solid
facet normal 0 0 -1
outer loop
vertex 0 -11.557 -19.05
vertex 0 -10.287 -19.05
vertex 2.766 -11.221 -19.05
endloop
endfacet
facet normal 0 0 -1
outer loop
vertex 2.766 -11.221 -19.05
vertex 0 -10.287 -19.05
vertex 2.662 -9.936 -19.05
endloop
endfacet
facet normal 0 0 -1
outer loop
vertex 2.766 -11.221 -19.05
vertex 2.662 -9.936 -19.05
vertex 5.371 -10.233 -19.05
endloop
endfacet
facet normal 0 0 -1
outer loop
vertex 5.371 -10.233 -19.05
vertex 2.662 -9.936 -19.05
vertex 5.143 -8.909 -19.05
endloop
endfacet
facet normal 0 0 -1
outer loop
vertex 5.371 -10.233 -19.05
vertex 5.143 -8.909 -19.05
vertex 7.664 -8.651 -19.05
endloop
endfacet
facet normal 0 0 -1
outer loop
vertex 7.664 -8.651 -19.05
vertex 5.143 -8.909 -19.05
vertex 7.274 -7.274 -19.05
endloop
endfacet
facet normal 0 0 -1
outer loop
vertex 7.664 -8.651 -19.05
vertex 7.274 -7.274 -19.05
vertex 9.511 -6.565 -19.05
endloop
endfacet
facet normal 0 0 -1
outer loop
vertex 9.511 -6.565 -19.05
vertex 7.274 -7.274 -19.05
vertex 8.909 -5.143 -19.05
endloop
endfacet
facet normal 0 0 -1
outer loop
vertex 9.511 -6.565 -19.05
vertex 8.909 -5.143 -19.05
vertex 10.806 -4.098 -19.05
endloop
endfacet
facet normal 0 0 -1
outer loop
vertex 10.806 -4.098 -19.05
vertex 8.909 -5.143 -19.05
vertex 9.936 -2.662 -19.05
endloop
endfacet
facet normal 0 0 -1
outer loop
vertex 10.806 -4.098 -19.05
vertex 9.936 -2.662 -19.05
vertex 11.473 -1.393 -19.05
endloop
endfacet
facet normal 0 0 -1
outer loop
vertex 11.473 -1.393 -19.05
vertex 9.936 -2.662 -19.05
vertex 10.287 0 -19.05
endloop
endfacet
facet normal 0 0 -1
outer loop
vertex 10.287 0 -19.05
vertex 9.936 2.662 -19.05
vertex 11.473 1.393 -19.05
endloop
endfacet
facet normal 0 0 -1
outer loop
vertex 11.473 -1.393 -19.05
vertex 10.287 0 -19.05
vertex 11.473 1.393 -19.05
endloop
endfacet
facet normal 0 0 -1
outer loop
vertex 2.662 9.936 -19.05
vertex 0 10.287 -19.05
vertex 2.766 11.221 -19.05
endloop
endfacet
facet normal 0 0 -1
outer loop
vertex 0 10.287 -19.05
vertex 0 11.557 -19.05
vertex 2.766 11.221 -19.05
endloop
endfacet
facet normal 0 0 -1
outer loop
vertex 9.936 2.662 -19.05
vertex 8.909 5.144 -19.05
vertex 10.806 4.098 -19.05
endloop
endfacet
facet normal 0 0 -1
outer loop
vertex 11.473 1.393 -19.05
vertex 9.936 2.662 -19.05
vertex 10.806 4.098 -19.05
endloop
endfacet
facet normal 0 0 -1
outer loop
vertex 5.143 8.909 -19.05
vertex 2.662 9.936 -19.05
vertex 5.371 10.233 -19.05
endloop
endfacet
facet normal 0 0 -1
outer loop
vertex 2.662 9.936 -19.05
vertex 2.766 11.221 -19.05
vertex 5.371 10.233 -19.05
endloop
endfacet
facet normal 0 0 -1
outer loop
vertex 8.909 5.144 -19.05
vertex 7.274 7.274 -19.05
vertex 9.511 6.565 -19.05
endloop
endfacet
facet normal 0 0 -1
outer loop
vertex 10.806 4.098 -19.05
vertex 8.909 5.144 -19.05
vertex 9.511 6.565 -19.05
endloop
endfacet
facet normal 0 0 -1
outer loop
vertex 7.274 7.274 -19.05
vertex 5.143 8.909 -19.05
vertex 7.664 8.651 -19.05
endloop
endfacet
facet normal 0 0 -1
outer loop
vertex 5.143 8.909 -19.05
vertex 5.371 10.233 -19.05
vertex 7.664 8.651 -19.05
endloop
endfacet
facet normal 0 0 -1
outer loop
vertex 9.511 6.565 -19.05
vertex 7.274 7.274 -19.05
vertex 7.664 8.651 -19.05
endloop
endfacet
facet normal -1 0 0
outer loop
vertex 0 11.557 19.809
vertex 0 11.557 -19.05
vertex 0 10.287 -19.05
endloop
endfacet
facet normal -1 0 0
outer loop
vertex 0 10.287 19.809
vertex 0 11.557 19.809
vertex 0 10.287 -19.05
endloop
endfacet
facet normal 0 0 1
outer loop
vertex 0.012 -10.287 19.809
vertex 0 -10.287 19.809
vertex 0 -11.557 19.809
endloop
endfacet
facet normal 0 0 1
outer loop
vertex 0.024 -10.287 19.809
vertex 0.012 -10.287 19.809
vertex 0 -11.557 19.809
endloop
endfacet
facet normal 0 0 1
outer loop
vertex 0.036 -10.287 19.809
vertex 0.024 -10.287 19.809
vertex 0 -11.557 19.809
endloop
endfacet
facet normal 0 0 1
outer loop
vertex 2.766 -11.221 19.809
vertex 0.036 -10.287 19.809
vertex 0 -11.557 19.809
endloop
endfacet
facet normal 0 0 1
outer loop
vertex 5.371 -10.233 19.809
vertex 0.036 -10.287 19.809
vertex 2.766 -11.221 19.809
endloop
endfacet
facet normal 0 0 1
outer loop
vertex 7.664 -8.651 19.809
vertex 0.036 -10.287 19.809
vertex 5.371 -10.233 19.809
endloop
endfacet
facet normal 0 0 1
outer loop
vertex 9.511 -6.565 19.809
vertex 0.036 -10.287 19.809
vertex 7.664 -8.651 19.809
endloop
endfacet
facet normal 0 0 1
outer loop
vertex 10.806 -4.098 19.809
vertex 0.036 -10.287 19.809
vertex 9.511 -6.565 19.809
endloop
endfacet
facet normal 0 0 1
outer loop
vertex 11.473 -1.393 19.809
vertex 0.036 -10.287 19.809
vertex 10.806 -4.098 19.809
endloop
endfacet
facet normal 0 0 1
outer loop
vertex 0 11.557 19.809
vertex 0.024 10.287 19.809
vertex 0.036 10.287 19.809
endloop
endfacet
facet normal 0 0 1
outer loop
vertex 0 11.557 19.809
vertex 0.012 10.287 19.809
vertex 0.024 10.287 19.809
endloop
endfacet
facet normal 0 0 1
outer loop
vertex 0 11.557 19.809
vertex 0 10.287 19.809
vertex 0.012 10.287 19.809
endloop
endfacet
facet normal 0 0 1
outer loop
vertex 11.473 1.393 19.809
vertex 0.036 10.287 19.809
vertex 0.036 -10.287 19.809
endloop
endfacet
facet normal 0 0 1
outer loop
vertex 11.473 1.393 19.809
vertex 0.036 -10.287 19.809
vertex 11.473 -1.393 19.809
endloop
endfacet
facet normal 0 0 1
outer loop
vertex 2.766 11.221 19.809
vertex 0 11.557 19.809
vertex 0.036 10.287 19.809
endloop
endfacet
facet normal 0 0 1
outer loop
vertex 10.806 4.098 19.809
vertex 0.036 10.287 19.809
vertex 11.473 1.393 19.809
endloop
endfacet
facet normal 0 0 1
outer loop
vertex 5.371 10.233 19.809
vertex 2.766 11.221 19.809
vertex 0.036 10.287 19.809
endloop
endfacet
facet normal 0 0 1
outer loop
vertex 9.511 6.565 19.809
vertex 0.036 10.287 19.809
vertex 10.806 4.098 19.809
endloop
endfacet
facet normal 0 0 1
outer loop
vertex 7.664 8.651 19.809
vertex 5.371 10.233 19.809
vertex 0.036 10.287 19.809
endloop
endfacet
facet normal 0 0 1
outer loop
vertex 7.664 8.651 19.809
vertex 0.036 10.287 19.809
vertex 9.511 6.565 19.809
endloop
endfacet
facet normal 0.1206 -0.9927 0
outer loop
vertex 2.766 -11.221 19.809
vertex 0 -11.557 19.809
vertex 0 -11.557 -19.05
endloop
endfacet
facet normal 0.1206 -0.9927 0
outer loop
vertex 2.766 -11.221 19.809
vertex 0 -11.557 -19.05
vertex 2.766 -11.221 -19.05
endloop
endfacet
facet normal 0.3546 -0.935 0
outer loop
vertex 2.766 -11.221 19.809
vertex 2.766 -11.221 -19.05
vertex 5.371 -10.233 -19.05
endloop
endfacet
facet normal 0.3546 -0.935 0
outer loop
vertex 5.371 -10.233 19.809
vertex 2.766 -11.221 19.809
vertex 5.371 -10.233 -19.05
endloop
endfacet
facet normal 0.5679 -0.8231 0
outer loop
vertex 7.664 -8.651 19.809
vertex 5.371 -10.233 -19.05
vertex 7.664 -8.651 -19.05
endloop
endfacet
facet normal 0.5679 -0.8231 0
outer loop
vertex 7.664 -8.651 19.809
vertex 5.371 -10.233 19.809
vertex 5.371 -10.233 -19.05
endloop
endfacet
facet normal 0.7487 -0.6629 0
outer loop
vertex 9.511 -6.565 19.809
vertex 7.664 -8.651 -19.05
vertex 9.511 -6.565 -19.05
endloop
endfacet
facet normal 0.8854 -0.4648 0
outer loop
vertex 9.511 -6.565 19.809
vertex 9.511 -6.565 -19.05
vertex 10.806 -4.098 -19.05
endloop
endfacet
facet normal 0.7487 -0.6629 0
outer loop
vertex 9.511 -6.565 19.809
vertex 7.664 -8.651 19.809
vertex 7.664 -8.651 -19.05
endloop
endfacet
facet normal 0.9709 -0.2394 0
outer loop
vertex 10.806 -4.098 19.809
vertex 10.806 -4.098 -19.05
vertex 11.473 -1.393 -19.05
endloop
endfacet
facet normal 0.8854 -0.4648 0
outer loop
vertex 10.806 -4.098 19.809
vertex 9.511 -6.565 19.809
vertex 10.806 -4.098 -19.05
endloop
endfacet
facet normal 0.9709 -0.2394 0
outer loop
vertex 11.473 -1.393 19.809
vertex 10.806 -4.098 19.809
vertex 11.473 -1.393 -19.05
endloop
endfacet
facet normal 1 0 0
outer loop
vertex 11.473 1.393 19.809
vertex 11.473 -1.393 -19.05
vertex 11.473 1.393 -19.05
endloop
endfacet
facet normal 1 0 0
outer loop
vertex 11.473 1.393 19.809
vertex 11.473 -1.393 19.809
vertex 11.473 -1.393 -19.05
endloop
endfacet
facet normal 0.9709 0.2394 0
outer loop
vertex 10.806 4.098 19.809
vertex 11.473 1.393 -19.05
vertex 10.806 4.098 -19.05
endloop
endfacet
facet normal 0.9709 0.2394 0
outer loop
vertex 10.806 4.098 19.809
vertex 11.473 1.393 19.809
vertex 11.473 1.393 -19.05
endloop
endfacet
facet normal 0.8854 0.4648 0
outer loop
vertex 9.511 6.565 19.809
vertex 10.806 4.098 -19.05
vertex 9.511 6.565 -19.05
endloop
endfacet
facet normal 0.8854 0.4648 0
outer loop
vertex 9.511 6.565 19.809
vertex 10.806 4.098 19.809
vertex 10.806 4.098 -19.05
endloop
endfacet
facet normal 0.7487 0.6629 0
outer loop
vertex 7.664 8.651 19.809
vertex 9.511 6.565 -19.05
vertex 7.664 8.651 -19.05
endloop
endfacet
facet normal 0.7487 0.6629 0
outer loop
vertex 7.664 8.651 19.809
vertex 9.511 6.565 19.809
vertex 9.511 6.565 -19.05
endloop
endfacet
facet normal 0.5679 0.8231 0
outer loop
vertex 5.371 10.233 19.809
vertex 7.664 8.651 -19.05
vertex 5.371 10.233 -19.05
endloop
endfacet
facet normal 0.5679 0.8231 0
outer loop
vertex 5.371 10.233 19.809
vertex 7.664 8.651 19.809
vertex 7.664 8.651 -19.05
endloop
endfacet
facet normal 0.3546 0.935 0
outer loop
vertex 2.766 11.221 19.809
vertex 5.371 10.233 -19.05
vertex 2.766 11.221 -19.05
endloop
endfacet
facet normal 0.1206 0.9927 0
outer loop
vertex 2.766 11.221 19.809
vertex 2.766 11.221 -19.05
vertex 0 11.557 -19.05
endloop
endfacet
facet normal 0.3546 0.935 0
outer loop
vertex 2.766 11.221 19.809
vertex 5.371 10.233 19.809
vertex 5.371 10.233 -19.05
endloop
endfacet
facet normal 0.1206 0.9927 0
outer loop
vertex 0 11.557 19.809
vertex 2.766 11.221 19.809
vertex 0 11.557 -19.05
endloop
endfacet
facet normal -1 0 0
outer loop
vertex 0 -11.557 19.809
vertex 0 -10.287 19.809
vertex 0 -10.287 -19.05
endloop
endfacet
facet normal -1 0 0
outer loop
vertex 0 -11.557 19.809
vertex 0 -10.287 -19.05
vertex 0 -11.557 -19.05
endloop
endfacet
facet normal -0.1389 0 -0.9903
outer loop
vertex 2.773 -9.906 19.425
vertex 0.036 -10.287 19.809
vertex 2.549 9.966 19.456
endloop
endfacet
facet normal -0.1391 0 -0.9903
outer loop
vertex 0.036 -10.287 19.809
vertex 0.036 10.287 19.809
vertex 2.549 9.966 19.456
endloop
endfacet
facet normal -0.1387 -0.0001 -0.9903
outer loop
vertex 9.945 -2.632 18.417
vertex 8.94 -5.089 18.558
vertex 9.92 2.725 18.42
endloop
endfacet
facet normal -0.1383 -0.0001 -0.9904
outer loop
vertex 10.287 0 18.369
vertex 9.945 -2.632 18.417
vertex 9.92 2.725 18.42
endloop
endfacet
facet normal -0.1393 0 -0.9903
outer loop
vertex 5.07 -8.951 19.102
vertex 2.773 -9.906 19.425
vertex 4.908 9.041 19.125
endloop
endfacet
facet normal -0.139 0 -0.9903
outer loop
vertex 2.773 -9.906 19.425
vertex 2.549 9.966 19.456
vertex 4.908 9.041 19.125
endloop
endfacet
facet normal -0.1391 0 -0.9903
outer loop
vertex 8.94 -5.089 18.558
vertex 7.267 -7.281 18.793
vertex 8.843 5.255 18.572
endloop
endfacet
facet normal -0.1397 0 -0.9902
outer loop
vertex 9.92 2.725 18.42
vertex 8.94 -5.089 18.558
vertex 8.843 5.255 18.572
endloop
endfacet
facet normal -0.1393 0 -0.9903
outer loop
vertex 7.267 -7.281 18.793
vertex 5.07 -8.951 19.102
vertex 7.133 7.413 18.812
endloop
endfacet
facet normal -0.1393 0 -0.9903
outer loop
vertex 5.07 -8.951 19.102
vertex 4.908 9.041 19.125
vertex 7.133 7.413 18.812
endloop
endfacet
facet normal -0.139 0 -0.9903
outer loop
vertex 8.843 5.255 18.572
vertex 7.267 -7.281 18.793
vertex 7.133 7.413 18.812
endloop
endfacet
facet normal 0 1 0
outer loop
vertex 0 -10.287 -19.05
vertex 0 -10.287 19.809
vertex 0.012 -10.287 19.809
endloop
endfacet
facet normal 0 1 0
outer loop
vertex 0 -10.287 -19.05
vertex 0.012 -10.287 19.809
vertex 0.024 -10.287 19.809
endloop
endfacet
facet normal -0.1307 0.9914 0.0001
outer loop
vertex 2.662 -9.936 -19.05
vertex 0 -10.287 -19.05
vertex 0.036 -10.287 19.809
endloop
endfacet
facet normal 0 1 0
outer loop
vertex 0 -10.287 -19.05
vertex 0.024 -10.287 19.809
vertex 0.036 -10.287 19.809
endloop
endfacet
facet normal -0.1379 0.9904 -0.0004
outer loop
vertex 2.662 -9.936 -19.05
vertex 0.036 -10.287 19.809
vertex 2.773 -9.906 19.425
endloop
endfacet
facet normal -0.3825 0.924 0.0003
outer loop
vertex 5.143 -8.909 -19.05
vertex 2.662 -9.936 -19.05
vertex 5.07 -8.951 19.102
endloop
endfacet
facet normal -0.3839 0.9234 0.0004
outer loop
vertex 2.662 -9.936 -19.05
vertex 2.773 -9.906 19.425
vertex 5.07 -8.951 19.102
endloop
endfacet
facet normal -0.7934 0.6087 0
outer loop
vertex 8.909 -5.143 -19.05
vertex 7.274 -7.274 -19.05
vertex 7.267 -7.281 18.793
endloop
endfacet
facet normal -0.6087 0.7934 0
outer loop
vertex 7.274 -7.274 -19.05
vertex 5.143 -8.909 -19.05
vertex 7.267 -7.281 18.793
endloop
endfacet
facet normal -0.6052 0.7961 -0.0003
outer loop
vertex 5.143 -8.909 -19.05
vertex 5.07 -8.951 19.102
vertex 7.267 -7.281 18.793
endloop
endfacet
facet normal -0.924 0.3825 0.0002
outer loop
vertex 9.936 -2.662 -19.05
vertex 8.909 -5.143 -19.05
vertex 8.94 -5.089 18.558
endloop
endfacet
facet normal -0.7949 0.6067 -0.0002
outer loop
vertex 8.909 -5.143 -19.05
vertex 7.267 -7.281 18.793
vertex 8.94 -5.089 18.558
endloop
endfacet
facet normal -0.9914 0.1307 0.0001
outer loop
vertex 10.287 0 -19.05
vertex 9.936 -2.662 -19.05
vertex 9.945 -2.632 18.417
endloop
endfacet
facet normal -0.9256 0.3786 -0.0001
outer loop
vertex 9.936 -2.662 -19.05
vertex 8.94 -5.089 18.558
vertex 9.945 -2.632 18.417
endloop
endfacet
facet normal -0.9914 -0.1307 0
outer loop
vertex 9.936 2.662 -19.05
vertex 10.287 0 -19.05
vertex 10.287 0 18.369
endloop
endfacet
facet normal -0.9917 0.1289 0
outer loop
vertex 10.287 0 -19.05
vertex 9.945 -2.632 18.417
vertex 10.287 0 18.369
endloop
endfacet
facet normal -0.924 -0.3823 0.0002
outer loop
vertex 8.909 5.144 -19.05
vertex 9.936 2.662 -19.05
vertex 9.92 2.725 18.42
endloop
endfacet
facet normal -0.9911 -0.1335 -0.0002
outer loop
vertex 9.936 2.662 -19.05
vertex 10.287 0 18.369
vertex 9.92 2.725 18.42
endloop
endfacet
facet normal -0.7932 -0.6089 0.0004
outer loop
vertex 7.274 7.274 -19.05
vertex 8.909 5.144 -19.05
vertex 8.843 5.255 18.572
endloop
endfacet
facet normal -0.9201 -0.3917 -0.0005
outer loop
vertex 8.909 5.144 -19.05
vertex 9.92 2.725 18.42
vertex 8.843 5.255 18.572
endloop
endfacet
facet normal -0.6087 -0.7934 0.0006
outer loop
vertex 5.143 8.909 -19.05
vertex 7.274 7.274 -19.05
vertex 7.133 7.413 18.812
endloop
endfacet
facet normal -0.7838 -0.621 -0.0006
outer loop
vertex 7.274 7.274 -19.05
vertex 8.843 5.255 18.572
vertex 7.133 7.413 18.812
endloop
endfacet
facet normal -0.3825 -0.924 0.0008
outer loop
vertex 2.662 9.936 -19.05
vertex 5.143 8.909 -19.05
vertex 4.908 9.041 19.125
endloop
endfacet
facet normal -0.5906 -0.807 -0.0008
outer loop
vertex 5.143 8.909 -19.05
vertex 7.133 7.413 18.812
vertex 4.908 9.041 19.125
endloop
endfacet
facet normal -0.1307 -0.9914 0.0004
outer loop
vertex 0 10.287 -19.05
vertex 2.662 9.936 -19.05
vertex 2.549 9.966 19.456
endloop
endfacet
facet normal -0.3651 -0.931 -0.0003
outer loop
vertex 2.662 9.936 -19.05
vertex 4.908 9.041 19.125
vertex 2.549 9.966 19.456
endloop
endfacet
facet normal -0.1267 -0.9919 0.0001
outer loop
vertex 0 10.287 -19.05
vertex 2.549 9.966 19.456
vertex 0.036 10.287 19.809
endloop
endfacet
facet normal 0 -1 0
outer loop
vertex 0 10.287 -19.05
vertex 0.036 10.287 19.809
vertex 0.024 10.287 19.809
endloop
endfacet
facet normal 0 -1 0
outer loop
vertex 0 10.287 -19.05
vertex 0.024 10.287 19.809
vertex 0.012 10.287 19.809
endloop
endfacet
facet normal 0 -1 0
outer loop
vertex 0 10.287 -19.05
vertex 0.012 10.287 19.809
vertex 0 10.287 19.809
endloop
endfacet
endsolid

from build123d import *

# Parameters (mm, degrees)
F1_DEPTH    = 19.05
F3_DEPTH    = 0.75946
F4_T4_DEPTH = 76.9415838332
F4_S5_R     = 10.287
F4_T6_DEPTH = 40


# Not quite as in the source:
# - a fillet or chamfer that OpenCascade refuses, or shapes differently, is made with other operations: its cross-section is extruded or revolved along the edge and cut away or added


with BuildPart() as f1:
    # F0 (on Top) → F1 (new body, symmetric)
    with BuildSketch(Plane.XY):
        with BuildLine():
            ThreePointArc((0, 10.287), (10.287, 0), (0, -10.287))
            Line((0, -10.287), (0, -11.557))
            ThreePointArc((0, -11.557), (11.557, 0), (0, 11.557))
            Line((0, 11.557), (0, 10.287))
        make_face()
    extrude(amount=F1_DEPTH, both=True)

    # F2 (on face) → F3 (join, symmetric)
    with BuildSketch(Plane.XY.offset(19.05)):
        with BuildLine():
            Line((0, 11.557), (0, -11.557))
            ThreePointArc((0, -11.557), (11.557, 0), (0, 11.557))
        make_face()
    extrude(amount=F3_DEPTH, both=True)

    # F4: chamfer of 1.524 x 10.8438234569 on 1 edges, made by hand


with BuildPart() as f4_tool2:
    # F4_s3 → F4_t4 (new body)
    with BuildSketch(Plane.XZ.offset(-38.4707919166)):
        Polygon((0, 19.81454), (10.8438234569, 18.29054), (0, 18.29054), align=None)
    extrude(amount=F4_T4_DEPTH)

    # F4_s5 → F4_t6 (intersect, symmetric)
    with BuildSketch(Plane.XY.offset(19.1)):
        Circle(F4_S5_R)
    extrude(amount=F4_T6_DEPTH, both=True, mode=Mode.INTERSECT)


with BuildPart() as f1_1:
    add(f1.part)

    # F4_t1: cut F4_tool2
    add(f4_tool2.part, mode=Mode.SUBTRACT)


solid = f1_1.part
